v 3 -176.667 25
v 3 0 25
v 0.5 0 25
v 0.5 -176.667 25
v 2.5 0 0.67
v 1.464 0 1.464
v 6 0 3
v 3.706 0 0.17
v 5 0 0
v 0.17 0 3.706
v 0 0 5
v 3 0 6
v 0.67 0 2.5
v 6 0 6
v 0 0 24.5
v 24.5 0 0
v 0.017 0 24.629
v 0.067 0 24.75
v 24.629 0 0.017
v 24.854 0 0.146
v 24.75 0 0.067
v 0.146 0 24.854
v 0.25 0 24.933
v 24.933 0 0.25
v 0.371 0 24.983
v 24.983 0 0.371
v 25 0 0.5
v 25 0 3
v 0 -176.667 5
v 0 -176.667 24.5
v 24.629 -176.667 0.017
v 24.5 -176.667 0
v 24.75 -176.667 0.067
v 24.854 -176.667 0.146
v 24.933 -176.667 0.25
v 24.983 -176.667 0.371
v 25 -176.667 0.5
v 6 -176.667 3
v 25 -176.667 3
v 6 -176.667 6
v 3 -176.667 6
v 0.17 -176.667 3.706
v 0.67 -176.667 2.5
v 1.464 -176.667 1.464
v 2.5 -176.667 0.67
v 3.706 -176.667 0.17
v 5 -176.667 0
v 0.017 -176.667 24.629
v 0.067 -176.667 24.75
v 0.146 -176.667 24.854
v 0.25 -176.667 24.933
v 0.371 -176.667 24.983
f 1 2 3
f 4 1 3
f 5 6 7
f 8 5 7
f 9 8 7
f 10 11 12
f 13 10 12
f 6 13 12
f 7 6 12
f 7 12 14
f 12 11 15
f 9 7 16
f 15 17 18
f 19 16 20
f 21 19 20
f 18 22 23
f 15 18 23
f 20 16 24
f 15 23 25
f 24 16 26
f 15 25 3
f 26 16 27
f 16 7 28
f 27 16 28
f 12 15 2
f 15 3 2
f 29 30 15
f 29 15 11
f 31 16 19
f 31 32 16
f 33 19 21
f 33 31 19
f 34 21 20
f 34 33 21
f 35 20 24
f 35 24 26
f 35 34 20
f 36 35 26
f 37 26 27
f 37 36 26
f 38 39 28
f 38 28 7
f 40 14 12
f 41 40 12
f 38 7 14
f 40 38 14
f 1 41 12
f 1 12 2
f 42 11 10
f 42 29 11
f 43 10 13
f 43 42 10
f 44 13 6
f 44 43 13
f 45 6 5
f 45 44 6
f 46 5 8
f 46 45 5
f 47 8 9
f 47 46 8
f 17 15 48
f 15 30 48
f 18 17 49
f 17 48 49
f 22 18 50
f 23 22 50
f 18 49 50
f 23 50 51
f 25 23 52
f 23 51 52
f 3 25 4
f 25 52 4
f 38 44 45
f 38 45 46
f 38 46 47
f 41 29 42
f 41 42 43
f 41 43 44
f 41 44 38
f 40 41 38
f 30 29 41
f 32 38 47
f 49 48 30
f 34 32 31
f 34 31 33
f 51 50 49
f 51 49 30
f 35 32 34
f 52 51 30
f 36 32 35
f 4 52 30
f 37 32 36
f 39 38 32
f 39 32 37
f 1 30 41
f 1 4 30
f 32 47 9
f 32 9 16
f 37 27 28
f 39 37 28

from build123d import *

# Parameters (mm, degrees)
F1_DEPTH = 176.666666
F2_R     = 5
F3_R     = 0.5


with BuildPart() as f1:
    # F0 (on Front) → F1 (new body)
    with BuildSketch(Plane.XZ):
        Polygon((3, 25), (0, 25), (0, 0), (25, 0), (25, 3), (6, 3), (6, 6), (3, 6), align=None)
    extrude(amount=F1_DEPTH)

    # F2
    f2_edges = [f1.edges().sort_by_distance(p)[0] for p in [
        (0, -88.333333, 0),
    ]]
    fillet(f2_edges, radius=F2_R)

    # F3
    f3_edges = [f1.edges().sort_by_distance(p)[0] for p in [
        (0, -88.333333, 25),
        (25, -88.333333, 0),
    ]]
    fillet(f3_edges, radius=F3_R)


solid = f1.part
